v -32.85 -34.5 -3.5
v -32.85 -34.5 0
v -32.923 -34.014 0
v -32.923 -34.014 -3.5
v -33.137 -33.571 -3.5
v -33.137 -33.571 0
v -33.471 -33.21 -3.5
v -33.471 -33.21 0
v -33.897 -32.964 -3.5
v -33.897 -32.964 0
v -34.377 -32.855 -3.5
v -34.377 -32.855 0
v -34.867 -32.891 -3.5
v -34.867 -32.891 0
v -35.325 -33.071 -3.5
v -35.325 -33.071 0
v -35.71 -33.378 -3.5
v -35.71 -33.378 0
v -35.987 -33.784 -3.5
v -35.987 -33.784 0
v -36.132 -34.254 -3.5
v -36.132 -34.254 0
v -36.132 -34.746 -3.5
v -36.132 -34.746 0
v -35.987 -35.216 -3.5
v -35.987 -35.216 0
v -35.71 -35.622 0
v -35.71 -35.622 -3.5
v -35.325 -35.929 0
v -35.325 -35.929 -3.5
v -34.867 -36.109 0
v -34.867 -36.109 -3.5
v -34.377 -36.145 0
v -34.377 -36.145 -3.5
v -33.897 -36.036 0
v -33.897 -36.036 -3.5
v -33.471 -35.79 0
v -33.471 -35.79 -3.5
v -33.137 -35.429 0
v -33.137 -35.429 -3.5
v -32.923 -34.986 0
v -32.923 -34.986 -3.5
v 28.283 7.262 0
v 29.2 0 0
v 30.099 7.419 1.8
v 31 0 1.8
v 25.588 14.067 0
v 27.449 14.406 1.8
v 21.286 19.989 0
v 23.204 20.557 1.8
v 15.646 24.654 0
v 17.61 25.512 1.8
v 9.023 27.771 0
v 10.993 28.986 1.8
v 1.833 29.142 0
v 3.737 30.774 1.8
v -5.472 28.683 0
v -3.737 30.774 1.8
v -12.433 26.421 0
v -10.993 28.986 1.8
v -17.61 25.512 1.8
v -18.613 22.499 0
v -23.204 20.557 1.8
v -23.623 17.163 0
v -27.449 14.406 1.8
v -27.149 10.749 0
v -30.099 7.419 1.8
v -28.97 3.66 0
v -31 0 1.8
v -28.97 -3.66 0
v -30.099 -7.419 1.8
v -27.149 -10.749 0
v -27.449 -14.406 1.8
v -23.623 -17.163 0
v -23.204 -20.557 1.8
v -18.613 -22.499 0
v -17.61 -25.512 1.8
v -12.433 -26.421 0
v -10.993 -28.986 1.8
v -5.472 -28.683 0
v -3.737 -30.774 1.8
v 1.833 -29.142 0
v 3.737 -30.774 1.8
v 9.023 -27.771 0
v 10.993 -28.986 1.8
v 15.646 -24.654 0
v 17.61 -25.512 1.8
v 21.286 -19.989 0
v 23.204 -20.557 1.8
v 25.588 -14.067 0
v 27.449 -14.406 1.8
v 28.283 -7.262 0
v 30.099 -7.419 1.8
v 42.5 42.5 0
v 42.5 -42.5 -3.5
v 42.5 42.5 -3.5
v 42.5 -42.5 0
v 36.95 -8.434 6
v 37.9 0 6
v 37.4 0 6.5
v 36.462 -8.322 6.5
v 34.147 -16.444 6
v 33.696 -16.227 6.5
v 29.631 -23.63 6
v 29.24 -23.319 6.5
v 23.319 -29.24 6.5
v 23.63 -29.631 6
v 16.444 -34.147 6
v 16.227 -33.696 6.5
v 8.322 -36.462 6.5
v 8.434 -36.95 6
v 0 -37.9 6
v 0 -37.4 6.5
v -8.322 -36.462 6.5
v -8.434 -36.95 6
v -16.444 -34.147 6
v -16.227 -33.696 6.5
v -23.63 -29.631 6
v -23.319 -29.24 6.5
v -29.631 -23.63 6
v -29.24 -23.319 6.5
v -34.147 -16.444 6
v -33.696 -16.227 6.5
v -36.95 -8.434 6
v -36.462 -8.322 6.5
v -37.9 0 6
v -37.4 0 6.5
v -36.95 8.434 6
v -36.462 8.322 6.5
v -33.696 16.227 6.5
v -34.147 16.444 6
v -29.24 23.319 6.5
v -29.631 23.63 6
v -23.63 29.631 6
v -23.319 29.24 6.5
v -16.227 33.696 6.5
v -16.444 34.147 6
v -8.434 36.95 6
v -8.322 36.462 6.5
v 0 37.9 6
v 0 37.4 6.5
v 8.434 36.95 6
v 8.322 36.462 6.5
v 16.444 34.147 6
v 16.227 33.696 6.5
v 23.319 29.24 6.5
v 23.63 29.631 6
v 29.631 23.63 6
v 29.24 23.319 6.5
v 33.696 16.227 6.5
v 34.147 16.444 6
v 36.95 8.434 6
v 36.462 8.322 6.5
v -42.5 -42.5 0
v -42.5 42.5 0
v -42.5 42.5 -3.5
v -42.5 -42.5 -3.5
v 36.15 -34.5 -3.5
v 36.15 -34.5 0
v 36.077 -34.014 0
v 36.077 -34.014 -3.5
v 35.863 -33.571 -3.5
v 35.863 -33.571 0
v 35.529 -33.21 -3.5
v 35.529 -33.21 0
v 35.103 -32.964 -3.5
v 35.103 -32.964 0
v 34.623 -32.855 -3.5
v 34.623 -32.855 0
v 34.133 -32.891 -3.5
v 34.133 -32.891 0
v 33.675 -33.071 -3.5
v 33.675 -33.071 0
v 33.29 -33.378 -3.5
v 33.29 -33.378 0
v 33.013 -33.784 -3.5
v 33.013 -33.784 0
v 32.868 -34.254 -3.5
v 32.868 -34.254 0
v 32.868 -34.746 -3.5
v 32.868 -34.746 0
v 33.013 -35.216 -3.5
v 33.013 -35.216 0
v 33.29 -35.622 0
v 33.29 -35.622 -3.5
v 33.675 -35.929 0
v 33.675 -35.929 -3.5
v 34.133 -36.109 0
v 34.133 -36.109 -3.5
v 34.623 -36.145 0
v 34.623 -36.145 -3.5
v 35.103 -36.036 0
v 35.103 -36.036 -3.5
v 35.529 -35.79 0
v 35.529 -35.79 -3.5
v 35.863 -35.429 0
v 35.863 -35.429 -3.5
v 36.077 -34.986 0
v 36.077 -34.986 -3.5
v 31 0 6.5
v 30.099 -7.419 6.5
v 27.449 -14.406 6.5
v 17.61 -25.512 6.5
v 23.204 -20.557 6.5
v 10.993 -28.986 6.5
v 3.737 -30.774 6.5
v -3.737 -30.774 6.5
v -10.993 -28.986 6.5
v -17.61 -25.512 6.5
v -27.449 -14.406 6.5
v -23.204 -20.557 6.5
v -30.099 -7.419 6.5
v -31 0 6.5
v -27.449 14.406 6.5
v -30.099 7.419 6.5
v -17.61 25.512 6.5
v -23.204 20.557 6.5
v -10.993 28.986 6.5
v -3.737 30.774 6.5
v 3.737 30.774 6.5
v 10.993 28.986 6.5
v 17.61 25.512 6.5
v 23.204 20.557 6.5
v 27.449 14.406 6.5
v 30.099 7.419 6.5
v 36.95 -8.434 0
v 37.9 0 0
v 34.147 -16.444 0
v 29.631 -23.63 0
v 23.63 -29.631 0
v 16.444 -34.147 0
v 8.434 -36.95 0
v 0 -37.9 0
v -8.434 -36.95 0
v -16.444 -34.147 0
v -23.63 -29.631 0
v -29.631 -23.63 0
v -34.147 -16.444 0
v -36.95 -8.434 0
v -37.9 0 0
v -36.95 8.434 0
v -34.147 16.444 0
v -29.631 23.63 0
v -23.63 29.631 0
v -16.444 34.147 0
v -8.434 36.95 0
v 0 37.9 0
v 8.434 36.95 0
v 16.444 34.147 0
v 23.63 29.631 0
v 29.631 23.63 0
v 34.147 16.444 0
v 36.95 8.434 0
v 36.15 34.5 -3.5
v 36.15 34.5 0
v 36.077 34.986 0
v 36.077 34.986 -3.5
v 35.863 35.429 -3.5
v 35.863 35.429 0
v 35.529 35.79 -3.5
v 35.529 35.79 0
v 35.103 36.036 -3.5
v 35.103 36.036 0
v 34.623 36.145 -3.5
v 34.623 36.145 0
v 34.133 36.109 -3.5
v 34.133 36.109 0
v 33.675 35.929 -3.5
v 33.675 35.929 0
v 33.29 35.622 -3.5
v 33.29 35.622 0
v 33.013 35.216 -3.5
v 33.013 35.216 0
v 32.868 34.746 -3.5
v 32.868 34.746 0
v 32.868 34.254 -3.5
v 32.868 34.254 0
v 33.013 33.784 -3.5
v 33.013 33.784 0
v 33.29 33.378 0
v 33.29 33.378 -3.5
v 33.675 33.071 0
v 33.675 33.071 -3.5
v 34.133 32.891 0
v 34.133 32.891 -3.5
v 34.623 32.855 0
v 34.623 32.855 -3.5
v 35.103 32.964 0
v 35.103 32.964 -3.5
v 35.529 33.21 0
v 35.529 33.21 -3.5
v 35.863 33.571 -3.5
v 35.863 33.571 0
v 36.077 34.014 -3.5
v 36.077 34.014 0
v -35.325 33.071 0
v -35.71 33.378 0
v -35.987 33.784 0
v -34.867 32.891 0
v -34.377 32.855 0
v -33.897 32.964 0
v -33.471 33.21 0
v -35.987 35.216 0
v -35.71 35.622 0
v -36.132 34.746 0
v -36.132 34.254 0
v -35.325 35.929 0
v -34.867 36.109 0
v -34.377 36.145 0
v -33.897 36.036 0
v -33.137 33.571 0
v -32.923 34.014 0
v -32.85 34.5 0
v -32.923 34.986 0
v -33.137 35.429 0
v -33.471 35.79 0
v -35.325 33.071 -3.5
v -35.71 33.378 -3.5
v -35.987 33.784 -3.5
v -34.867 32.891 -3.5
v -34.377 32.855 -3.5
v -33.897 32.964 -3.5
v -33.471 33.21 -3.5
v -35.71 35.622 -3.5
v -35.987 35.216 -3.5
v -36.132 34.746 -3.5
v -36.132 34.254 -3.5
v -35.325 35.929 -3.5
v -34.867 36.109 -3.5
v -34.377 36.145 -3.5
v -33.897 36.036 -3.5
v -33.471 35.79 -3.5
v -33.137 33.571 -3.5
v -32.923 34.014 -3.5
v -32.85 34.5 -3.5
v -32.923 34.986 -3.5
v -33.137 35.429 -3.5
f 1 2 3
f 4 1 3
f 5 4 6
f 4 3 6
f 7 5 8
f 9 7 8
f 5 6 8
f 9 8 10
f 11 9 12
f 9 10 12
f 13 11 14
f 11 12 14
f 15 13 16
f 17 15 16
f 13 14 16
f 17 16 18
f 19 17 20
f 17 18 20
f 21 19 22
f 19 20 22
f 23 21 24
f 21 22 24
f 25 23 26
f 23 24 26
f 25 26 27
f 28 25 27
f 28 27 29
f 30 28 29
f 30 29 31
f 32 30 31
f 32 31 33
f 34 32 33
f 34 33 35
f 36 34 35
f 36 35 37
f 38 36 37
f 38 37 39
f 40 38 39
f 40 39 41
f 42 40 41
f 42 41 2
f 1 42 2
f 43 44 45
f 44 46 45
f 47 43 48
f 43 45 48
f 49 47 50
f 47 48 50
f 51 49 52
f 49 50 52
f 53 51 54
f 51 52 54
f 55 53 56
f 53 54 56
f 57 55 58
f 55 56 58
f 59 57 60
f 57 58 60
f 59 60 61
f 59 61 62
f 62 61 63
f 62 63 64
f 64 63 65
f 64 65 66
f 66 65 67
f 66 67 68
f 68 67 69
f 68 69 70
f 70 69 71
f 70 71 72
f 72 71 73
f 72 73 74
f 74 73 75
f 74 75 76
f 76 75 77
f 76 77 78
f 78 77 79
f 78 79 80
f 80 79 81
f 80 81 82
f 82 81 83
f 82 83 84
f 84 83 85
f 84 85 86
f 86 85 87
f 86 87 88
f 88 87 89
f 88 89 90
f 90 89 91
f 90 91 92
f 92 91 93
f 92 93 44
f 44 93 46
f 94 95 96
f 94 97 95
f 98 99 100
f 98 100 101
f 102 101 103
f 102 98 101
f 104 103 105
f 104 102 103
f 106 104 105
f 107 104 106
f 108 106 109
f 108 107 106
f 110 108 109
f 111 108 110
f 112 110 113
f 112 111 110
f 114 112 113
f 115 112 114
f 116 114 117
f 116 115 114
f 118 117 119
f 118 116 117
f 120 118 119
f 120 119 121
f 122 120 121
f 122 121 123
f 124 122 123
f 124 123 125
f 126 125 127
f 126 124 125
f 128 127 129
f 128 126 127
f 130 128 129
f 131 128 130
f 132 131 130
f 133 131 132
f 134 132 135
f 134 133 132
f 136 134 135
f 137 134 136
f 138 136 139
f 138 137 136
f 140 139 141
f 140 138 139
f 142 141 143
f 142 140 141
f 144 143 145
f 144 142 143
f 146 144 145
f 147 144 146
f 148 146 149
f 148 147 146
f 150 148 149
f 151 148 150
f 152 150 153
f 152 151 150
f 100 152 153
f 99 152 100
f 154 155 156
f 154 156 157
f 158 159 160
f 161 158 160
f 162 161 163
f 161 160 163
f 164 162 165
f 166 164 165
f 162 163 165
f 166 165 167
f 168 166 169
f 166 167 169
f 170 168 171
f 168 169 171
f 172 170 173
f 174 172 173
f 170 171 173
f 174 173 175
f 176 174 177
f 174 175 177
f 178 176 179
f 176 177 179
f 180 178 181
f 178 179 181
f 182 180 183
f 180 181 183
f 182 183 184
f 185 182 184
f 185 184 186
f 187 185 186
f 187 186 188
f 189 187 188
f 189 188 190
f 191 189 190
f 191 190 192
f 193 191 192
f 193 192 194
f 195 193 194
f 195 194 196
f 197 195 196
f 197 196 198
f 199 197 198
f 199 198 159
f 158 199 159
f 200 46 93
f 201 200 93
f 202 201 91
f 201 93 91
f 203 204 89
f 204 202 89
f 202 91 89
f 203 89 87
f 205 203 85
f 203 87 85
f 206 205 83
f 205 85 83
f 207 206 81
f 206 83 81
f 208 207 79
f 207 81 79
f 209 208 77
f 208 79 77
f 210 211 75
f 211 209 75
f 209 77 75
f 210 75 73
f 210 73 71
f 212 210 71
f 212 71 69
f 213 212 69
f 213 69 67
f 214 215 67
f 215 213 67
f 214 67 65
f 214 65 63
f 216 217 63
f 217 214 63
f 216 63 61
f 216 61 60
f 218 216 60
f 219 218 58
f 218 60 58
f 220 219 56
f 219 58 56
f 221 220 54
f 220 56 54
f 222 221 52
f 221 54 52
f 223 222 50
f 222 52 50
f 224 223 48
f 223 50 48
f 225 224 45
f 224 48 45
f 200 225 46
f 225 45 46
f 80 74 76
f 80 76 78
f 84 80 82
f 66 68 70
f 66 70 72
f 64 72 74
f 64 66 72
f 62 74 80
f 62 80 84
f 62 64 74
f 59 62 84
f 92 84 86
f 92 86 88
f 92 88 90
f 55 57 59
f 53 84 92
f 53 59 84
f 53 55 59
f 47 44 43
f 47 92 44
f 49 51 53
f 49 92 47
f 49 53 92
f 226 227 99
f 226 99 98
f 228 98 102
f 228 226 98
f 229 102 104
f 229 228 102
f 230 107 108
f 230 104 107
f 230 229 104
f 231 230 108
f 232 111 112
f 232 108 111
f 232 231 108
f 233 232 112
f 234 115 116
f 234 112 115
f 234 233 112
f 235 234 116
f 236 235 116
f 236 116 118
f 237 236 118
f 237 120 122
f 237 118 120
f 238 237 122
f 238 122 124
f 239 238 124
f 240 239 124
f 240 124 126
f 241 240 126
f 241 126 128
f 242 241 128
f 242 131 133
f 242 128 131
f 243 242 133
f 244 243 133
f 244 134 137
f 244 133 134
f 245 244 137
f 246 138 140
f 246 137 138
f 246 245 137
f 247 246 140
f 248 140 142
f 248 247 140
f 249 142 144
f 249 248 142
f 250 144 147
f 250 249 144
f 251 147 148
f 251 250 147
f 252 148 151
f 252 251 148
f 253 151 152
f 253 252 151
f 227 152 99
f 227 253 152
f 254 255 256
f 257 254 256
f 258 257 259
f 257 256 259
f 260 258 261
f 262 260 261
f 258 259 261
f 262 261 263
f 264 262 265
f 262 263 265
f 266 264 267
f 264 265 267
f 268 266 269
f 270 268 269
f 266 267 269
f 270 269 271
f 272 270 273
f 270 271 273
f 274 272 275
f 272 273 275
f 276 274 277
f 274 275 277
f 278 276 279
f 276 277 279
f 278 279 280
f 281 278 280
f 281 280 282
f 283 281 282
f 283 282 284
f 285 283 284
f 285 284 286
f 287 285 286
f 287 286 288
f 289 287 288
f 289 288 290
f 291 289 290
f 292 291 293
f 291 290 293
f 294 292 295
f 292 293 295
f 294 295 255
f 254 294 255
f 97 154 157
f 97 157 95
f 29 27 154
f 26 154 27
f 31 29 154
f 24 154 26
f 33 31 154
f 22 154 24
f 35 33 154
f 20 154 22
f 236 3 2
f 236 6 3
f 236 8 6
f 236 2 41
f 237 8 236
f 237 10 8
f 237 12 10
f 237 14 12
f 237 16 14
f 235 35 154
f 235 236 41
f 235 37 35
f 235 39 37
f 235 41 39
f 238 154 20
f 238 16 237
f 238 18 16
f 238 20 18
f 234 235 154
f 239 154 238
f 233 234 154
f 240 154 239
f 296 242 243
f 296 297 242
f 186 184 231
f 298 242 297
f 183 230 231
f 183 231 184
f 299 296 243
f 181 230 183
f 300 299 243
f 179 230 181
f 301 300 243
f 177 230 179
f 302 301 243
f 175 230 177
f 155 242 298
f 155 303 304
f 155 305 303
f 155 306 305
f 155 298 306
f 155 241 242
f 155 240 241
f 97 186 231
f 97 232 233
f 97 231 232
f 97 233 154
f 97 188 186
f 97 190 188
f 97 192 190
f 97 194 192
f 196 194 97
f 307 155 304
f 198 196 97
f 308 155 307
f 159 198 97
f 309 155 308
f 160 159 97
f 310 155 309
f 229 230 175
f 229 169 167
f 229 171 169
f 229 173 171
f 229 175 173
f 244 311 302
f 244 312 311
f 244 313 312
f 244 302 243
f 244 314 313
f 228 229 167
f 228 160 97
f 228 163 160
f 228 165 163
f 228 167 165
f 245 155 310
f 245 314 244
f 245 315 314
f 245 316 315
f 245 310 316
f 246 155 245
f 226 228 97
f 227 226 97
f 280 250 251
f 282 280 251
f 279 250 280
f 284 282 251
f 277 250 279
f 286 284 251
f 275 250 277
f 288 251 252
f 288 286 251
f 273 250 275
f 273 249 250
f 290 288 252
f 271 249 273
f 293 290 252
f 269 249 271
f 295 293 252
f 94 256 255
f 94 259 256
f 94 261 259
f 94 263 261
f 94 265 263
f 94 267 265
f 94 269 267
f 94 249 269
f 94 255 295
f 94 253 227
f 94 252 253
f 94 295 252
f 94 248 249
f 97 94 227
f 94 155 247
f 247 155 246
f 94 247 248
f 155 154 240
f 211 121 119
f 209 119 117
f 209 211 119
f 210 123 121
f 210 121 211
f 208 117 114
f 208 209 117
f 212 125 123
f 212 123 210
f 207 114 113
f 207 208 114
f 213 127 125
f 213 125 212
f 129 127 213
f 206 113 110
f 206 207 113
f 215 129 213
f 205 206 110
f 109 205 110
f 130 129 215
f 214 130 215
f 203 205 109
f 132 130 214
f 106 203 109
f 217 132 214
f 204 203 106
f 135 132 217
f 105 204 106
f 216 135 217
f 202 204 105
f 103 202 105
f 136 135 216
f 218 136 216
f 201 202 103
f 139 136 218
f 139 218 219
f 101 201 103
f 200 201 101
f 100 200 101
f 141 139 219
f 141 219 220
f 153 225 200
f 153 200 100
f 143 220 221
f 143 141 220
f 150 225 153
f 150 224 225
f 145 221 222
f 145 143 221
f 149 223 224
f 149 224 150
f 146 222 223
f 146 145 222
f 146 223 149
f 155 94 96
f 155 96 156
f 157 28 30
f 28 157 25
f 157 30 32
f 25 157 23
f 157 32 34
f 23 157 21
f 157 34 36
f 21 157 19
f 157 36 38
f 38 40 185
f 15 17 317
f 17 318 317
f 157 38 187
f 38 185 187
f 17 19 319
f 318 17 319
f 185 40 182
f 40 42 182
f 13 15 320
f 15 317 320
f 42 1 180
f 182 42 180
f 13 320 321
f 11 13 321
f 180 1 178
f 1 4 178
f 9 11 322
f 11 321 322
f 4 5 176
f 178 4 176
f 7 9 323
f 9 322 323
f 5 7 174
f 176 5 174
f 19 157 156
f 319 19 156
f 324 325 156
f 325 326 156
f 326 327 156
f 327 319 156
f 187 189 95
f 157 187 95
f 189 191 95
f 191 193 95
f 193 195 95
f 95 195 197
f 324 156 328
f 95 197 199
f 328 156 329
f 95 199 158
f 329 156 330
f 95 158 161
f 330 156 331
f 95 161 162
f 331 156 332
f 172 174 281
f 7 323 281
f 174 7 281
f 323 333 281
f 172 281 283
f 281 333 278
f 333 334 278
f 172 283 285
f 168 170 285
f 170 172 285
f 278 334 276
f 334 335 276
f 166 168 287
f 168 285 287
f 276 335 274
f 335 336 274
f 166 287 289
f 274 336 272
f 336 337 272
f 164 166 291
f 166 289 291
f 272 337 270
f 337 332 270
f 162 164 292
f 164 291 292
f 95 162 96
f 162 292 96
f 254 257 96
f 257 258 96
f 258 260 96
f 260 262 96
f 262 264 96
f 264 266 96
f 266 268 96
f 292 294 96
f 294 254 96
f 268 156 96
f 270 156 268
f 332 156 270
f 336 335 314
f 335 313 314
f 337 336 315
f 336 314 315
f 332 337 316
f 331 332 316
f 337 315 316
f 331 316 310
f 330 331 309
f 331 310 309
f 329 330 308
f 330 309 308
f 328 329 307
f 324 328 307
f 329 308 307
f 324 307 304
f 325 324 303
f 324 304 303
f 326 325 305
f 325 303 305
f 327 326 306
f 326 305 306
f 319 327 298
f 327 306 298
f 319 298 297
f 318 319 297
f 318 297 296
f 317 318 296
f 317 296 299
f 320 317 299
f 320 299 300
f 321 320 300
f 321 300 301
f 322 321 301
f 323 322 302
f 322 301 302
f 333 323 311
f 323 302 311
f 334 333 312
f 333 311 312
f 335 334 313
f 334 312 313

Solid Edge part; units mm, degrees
sketch "Sketch1" plane through (0, 0, 0) normal (0, 0, 1) x (1, 0, 0)
  circle A0 centre (34.5, 34.5) radius 1.65
  circle A1 centre (-34.5, 34.5) radius 1.65
  circle A2 centre (-34.5, -34.5) radius 1.65
  circle A3 centre (34.5, -34.5) radius 1.65
  line L0 (42.5, 42.5) -> (-42.5, 42.5)
  line L1 (-42.5, 42.5) -> (-42.5, -42.5)
  line L2 (-42.5, -42.5) -> (42.5, -42.5)
  line L3 (42.5, -42.5) -> (42.5, 42.5)
extrude "Protrusion1" add sketch "Sketch1" against normal blind 3.5
sketch "Sketch2" plane through (0, 0, 0) normal (0, 0, 1) x (1, 0, 0)
  circle A0 centre (0, 0) radius 31
  circle A1 centre (0, 0) radius 37.9
extrude "ExtrudedProtrusion_2" add sketch "Sketch2" along normal blind 6.5
chamfer "Chamfer_1" distance 0.5 angle 45 1 edges at (-37.9, 0, 6.5)
chamfer "Chamfer_2" distance 1.8 angle 45 1 edges at (-31, 0, 0)
